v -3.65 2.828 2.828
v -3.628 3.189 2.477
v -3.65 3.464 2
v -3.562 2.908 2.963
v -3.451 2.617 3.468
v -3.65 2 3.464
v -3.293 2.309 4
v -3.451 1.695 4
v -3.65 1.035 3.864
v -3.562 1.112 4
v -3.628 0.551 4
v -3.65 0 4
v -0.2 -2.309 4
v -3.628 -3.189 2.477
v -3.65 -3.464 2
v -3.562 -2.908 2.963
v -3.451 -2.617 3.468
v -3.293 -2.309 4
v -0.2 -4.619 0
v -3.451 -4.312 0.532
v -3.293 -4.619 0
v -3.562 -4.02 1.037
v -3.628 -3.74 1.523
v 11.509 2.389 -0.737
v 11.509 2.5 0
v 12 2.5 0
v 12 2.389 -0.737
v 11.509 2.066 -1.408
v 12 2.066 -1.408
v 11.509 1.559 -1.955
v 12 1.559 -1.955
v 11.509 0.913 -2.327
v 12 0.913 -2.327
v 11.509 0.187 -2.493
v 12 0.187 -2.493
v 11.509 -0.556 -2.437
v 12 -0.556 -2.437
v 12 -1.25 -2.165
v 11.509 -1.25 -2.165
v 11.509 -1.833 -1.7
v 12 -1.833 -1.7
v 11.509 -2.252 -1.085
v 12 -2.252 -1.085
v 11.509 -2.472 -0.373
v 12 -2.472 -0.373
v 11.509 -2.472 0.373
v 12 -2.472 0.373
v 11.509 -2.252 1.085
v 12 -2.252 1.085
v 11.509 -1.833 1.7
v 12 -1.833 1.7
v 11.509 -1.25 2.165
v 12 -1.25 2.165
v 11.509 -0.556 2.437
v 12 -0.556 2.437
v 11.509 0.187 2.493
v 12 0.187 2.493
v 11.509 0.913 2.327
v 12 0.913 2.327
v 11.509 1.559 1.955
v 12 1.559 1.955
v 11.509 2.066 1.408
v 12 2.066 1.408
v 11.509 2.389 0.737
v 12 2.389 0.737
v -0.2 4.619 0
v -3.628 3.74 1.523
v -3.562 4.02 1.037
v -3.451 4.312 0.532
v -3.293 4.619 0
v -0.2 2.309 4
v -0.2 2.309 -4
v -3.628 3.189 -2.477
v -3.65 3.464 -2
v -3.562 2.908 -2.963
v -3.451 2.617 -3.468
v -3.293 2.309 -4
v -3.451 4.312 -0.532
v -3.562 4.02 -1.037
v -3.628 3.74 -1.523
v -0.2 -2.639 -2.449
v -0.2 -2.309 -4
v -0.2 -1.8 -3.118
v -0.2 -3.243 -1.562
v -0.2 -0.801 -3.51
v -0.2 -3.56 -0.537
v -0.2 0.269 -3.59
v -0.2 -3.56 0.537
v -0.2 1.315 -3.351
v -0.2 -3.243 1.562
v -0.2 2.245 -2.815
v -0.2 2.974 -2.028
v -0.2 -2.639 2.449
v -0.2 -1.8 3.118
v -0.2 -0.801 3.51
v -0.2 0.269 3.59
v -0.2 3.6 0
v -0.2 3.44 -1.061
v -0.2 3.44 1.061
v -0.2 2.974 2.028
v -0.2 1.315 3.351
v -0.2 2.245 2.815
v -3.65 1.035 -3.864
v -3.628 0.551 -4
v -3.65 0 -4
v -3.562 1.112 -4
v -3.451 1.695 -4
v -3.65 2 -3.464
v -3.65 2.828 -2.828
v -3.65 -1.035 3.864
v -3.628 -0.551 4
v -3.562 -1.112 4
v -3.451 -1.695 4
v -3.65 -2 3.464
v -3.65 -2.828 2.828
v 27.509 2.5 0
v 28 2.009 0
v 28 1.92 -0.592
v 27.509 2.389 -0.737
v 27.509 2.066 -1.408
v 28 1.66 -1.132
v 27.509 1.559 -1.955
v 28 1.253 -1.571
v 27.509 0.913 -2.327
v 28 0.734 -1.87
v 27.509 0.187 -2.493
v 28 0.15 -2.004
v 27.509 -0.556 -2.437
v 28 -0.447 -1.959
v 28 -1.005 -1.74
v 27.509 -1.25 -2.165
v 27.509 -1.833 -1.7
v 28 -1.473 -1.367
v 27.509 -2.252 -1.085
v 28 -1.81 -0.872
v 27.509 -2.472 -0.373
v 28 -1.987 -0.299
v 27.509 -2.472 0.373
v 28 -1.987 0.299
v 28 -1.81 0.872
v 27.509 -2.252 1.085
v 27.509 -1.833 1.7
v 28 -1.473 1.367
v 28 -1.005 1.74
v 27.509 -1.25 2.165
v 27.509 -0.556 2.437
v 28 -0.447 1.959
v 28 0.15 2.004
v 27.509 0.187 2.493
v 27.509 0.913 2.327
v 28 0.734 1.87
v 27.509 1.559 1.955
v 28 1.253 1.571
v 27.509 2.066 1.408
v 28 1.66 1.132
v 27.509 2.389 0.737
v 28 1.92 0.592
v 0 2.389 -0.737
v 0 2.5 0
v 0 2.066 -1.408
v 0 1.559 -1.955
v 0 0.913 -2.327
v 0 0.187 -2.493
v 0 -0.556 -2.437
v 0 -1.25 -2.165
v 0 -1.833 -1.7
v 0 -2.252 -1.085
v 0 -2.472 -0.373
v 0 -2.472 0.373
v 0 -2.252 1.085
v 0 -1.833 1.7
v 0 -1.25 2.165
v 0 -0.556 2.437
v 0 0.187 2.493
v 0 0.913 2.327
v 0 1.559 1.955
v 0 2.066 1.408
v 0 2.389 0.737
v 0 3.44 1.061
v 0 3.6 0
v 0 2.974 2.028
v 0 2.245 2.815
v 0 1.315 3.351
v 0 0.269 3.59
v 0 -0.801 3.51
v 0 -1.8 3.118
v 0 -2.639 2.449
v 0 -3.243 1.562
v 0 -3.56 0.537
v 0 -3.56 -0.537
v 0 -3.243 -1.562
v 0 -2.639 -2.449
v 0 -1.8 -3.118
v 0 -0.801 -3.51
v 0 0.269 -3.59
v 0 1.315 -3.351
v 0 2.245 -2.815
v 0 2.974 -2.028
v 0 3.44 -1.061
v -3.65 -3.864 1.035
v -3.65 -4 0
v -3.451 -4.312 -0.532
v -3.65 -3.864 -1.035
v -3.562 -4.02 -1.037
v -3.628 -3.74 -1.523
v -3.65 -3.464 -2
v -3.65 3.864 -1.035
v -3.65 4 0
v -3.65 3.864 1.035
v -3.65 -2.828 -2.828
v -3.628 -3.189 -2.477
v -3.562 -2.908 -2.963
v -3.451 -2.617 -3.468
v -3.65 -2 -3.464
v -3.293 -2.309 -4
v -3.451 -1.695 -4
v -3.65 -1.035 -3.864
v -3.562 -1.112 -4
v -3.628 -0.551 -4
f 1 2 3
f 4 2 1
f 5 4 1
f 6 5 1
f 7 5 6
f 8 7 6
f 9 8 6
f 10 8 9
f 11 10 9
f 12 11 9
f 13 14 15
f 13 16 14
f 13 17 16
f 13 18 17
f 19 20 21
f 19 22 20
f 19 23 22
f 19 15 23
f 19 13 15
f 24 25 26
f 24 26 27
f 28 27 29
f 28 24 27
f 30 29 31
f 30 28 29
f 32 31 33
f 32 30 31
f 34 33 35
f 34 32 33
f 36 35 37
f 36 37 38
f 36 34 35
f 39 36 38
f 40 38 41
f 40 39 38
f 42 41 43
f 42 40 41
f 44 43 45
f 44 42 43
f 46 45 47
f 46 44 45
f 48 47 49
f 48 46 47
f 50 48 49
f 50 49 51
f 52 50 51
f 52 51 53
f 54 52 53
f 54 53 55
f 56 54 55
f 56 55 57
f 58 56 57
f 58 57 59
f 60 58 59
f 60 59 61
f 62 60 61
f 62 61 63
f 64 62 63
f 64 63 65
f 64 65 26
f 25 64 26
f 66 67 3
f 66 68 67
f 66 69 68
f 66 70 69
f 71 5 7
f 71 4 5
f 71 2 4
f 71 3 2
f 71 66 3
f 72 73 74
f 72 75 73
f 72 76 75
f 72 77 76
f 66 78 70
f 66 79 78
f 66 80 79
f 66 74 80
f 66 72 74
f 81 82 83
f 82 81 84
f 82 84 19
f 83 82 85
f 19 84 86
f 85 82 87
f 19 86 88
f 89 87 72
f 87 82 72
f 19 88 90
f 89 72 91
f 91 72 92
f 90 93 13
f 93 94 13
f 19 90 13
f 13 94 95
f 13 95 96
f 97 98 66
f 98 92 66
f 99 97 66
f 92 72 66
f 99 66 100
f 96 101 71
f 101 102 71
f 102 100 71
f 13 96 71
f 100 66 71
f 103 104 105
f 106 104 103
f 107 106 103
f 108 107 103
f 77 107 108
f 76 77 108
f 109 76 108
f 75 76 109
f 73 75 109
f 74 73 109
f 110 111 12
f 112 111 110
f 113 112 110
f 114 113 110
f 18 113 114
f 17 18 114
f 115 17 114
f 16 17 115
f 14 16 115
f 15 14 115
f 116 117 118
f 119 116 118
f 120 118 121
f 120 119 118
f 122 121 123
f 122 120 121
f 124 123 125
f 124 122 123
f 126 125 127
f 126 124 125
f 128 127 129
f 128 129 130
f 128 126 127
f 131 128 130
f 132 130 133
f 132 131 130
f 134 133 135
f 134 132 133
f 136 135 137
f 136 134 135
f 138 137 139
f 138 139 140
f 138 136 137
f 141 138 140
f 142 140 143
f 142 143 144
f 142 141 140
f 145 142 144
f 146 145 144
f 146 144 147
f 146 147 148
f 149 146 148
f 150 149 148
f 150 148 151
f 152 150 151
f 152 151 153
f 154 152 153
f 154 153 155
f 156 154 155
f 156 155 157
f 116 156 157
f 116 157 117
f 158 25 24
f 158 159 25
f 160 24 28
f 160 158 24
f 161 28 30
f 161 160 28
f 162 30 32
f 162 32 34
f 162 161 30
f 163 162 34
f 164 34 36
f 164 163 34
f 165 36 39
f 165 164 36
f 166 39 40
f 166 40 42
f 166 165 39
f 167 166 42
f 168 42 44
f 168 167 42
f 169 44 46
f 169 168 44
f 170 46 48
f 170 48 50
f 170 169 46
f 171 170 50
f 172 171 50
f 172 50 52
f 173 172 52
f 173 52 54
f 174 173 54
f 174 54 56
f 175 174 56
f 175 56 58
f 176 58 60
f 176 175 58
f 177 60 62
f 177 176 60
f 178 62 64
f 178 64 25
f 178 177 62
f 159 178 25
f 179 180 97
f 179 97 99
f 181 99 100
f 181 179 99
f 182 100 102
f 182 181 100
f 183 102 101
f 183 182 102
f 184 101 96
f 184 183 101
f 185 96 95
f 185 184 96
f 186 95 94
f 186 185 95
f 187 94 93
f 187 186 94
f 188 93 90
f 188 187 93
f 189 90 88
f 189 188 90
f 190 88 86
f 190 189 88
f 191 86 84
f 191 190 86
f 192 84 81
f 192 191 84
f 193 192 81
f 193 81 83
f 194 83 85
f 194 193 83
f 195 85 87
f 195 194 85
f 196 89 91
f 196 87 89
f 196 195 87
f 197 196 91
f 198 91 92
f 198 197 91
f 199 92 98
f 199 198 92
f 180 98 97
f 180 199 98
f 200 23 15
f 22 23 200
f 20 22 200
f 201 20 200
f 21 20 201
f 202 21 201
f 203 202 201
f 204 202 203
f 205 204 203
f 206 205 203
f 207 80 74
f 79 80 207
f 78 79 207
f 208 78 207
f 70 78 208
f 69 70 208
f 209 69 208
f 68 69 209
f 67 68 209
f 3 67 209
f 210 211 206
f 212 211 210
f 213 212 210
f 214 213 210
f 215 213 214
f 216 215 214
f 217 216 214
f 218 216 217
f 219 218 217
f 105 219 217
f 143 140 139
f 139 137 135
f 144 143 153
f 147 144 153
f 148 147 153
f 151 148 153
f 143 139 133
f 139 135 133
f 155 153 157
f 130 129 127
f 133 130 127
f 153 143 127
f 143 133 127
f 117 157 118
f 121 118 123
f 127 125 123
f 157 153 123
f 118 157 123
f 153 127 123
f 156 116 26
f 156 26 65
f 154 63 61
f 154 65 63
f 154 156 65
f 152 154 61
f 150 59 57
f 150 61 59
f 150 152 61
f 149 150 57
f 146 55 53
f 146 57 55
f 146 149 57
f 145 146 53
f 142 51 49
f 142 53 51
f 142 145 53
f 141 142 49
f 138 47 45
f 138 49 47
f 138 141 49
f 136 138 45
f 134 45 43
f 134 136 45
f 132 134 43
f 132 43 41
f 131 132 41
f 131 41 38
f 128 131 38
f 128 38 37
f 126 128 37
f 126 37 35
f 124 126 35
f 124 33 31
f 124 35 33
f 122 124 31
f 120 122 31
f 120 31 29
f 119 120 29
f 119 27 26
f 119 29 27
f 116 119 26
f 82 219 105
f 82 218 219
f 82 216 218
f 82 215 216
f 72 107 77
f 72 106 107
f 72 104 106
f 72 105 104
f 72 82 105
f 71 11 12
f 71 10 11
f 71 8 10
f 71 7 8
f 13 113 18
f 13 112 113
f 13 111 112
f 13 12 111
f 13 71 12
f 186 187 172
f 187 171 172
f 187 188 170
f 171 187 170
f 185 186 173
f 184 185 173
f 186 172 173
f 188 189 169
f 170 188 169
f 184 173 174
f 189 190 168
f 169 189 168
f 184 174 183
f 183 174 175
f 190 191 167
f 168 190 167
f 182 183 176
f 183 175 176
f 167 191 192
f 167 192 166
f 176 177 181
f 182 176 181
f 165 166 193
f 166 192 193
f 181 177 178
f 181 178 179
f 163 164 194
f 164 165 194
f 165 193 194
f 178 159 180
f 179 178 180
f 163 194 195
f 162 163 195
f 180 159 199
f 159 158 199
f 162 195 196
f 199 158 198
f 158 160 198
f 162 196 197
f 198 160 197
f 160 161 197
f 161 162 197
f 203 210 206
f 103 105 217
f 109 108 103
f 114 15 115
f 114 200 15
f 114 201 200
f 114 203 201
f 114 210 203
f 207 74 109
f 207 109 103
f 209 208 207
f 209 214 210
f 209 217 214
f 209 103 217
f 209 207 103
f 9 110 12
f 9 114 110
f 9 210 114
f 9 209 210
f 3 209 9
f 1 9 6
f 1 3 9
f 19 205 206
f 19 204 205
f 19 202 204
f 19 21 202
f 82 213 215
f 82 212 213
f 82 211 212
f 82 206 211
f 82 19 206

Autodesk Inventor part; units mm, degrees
ref_plane "YZ Plane" through (0, 0, 0) normal (1, 0, 0) x (0, 1, 0)
ref_plane "XZ Plane" through (0, 0, 0) normal (0, 1, 0) x (-1, 0, 0)
sketch "Szkic1" plane through (0, 0, 0) normal (0, 0, 1) x (1, 0, 0)
  line L0 (0, 3.6) -> (0, 2.5)
  line L1 (12, 2.5) -> (28, 2.5)
  line L2 (28, 2.5) -> (28, 0)
  line L3 (28, 0) -> (-0.2001, 0)
  line L4 (-5.8401, 0) -> (33.64, 0) projected
  line L5 (-0.2001, 0) -> (-0.2001, 3.6)
  line L6 (-0.2001, 3.6) -> (0, 3.6)
  line L7 (12, 2.5) -> (11.5091, 2.5)
  line L8 (11.5091, 2.5) -> (0, 2.5)
  line L9 (0, -0.72) -> (0, 4.32) projected
  dimension "d0" = 28
  dimension "d1" = 16
  dimension "d2" = 5
  dimension "d9" = 0.2001
  dimension "d10" = 7.2
  dimension "d13" = 0.4909
  dimension "d14" = 5
revolve "Bryła" add sketch "Szkic1" angle 360 about axis through (28, 0, 0) along (-1, 0, 0)
sketch "Szkic2" plane through (-0.2001, 0, 0) normal (-1, 0, 0) x (0, 0, 1)
  line L0 (0, 4.6188) -> (4, 2.3094)
  line L1 (4, 2.3094) -> (4, -2.3094)
  line L2 (4, -2.3094) -> (0, -4.6188)
  line L3 (0, -4.6188) -> (-4, -2.3094)
  line L4 (-4, -2.3094) -> (-4, 2.3094)
  line L5 (-4, 2.3094) -> (0, 4.6188)
  point P0 (0, 0)
  point P1 (0, 0)
  dimension "d11" = 8
extrude "Głowica" add sketch "Szkic2" along normal blind 3.45
sketch "Szkic4" plane through (0, 0, 0) normal (0, 0, 1) x (1, 0, 0)
  line L0 (-3.6501, 4) -> (-3.6501, 4.6188)
  line L1 (-3.6501, 4.6188) -> (-3.2928, 4.6188)
  line L2 (-3.2928, 4.6188) -> (-3.6501, 4)
  line L3 (-4.3401, 0) -> (0.4899, 0) projected
  line L4 (-0.2001, 4.6188) -> (-3.6501, 4.6188) projected
  line L5 (-3.6501, 2.3094) -> (-3.6501, 4.6188) projected
  dimension "d5" = 30
  dimension "d19" = 8
revolve "Faza1" cut sketch "Szkic4" angle 360 about axis through (-10, 0, 0) along (1, 0, 0)
thread "Gwint" size "M5x0.8" class "6g" standard "ISO Metric profile" length 16
chamfer "Faza2" distance 0.4908 distance2 0.4909 1 edges at (28, -2.5, 0) measured on face at (28, 0.9945, -0.5526)
ref_plane "Work Plane1" through (1.525, 0, 0) normal (0, 0, 1) x (1, 0, 0)
equation "\"d0\" = NLG"
equation "\"d1\" = GEL"
equation "\"d2\" = GD"
equation "\"d10\" = SD2"
equation "\"d14\" = BDM"
equation "\"d11\" = SW"
equation "\"d3\" = KOH - SD"
equation "\"d5\" = ANG1"
equation "\"d19\" = SW0"
equation "\"d15\" = GEL"
equation "\"d6\" = -0.5 * SPD + 0.5 * GD"
equation "\"NLG\" = 28"
equation "\"GD\" = NND"
equation "\"BDM\" = NND"
equation "\"KOH\" = 3.65"
equation "\"GEL\" = 16"
equation "\"SW\" = 8"
equation "\"SW0\" = 8"
equation "\"SPD\" = NND - 1.2269 * PTC"
equation "\"SD2\" = 0.9 * SW"
equation "\"SD\" = 0.2"
equation "\"ANG1\" = 30deg"
equation "\"GAL\" = 0.61345 * PTC"
equation "\"GUL\" = 0.61345 * PTC"
equation "\"RR\" = 0.35"
equation "\"GD1\" = THREADDIA - 1.2269 * PTC"
equation "\"THREADDIA\" = 5"
equation "\"SDH\" = 7.55"
equation "\"TOA\" = 30deg"
equation "\"PTC\" = 0.8"
equation "\"NND\" = 5"
equation "\"E0\" = 1.155 * SW"
properties part number "BS 3692 - M5 x 28" material "Stal, miękka"
